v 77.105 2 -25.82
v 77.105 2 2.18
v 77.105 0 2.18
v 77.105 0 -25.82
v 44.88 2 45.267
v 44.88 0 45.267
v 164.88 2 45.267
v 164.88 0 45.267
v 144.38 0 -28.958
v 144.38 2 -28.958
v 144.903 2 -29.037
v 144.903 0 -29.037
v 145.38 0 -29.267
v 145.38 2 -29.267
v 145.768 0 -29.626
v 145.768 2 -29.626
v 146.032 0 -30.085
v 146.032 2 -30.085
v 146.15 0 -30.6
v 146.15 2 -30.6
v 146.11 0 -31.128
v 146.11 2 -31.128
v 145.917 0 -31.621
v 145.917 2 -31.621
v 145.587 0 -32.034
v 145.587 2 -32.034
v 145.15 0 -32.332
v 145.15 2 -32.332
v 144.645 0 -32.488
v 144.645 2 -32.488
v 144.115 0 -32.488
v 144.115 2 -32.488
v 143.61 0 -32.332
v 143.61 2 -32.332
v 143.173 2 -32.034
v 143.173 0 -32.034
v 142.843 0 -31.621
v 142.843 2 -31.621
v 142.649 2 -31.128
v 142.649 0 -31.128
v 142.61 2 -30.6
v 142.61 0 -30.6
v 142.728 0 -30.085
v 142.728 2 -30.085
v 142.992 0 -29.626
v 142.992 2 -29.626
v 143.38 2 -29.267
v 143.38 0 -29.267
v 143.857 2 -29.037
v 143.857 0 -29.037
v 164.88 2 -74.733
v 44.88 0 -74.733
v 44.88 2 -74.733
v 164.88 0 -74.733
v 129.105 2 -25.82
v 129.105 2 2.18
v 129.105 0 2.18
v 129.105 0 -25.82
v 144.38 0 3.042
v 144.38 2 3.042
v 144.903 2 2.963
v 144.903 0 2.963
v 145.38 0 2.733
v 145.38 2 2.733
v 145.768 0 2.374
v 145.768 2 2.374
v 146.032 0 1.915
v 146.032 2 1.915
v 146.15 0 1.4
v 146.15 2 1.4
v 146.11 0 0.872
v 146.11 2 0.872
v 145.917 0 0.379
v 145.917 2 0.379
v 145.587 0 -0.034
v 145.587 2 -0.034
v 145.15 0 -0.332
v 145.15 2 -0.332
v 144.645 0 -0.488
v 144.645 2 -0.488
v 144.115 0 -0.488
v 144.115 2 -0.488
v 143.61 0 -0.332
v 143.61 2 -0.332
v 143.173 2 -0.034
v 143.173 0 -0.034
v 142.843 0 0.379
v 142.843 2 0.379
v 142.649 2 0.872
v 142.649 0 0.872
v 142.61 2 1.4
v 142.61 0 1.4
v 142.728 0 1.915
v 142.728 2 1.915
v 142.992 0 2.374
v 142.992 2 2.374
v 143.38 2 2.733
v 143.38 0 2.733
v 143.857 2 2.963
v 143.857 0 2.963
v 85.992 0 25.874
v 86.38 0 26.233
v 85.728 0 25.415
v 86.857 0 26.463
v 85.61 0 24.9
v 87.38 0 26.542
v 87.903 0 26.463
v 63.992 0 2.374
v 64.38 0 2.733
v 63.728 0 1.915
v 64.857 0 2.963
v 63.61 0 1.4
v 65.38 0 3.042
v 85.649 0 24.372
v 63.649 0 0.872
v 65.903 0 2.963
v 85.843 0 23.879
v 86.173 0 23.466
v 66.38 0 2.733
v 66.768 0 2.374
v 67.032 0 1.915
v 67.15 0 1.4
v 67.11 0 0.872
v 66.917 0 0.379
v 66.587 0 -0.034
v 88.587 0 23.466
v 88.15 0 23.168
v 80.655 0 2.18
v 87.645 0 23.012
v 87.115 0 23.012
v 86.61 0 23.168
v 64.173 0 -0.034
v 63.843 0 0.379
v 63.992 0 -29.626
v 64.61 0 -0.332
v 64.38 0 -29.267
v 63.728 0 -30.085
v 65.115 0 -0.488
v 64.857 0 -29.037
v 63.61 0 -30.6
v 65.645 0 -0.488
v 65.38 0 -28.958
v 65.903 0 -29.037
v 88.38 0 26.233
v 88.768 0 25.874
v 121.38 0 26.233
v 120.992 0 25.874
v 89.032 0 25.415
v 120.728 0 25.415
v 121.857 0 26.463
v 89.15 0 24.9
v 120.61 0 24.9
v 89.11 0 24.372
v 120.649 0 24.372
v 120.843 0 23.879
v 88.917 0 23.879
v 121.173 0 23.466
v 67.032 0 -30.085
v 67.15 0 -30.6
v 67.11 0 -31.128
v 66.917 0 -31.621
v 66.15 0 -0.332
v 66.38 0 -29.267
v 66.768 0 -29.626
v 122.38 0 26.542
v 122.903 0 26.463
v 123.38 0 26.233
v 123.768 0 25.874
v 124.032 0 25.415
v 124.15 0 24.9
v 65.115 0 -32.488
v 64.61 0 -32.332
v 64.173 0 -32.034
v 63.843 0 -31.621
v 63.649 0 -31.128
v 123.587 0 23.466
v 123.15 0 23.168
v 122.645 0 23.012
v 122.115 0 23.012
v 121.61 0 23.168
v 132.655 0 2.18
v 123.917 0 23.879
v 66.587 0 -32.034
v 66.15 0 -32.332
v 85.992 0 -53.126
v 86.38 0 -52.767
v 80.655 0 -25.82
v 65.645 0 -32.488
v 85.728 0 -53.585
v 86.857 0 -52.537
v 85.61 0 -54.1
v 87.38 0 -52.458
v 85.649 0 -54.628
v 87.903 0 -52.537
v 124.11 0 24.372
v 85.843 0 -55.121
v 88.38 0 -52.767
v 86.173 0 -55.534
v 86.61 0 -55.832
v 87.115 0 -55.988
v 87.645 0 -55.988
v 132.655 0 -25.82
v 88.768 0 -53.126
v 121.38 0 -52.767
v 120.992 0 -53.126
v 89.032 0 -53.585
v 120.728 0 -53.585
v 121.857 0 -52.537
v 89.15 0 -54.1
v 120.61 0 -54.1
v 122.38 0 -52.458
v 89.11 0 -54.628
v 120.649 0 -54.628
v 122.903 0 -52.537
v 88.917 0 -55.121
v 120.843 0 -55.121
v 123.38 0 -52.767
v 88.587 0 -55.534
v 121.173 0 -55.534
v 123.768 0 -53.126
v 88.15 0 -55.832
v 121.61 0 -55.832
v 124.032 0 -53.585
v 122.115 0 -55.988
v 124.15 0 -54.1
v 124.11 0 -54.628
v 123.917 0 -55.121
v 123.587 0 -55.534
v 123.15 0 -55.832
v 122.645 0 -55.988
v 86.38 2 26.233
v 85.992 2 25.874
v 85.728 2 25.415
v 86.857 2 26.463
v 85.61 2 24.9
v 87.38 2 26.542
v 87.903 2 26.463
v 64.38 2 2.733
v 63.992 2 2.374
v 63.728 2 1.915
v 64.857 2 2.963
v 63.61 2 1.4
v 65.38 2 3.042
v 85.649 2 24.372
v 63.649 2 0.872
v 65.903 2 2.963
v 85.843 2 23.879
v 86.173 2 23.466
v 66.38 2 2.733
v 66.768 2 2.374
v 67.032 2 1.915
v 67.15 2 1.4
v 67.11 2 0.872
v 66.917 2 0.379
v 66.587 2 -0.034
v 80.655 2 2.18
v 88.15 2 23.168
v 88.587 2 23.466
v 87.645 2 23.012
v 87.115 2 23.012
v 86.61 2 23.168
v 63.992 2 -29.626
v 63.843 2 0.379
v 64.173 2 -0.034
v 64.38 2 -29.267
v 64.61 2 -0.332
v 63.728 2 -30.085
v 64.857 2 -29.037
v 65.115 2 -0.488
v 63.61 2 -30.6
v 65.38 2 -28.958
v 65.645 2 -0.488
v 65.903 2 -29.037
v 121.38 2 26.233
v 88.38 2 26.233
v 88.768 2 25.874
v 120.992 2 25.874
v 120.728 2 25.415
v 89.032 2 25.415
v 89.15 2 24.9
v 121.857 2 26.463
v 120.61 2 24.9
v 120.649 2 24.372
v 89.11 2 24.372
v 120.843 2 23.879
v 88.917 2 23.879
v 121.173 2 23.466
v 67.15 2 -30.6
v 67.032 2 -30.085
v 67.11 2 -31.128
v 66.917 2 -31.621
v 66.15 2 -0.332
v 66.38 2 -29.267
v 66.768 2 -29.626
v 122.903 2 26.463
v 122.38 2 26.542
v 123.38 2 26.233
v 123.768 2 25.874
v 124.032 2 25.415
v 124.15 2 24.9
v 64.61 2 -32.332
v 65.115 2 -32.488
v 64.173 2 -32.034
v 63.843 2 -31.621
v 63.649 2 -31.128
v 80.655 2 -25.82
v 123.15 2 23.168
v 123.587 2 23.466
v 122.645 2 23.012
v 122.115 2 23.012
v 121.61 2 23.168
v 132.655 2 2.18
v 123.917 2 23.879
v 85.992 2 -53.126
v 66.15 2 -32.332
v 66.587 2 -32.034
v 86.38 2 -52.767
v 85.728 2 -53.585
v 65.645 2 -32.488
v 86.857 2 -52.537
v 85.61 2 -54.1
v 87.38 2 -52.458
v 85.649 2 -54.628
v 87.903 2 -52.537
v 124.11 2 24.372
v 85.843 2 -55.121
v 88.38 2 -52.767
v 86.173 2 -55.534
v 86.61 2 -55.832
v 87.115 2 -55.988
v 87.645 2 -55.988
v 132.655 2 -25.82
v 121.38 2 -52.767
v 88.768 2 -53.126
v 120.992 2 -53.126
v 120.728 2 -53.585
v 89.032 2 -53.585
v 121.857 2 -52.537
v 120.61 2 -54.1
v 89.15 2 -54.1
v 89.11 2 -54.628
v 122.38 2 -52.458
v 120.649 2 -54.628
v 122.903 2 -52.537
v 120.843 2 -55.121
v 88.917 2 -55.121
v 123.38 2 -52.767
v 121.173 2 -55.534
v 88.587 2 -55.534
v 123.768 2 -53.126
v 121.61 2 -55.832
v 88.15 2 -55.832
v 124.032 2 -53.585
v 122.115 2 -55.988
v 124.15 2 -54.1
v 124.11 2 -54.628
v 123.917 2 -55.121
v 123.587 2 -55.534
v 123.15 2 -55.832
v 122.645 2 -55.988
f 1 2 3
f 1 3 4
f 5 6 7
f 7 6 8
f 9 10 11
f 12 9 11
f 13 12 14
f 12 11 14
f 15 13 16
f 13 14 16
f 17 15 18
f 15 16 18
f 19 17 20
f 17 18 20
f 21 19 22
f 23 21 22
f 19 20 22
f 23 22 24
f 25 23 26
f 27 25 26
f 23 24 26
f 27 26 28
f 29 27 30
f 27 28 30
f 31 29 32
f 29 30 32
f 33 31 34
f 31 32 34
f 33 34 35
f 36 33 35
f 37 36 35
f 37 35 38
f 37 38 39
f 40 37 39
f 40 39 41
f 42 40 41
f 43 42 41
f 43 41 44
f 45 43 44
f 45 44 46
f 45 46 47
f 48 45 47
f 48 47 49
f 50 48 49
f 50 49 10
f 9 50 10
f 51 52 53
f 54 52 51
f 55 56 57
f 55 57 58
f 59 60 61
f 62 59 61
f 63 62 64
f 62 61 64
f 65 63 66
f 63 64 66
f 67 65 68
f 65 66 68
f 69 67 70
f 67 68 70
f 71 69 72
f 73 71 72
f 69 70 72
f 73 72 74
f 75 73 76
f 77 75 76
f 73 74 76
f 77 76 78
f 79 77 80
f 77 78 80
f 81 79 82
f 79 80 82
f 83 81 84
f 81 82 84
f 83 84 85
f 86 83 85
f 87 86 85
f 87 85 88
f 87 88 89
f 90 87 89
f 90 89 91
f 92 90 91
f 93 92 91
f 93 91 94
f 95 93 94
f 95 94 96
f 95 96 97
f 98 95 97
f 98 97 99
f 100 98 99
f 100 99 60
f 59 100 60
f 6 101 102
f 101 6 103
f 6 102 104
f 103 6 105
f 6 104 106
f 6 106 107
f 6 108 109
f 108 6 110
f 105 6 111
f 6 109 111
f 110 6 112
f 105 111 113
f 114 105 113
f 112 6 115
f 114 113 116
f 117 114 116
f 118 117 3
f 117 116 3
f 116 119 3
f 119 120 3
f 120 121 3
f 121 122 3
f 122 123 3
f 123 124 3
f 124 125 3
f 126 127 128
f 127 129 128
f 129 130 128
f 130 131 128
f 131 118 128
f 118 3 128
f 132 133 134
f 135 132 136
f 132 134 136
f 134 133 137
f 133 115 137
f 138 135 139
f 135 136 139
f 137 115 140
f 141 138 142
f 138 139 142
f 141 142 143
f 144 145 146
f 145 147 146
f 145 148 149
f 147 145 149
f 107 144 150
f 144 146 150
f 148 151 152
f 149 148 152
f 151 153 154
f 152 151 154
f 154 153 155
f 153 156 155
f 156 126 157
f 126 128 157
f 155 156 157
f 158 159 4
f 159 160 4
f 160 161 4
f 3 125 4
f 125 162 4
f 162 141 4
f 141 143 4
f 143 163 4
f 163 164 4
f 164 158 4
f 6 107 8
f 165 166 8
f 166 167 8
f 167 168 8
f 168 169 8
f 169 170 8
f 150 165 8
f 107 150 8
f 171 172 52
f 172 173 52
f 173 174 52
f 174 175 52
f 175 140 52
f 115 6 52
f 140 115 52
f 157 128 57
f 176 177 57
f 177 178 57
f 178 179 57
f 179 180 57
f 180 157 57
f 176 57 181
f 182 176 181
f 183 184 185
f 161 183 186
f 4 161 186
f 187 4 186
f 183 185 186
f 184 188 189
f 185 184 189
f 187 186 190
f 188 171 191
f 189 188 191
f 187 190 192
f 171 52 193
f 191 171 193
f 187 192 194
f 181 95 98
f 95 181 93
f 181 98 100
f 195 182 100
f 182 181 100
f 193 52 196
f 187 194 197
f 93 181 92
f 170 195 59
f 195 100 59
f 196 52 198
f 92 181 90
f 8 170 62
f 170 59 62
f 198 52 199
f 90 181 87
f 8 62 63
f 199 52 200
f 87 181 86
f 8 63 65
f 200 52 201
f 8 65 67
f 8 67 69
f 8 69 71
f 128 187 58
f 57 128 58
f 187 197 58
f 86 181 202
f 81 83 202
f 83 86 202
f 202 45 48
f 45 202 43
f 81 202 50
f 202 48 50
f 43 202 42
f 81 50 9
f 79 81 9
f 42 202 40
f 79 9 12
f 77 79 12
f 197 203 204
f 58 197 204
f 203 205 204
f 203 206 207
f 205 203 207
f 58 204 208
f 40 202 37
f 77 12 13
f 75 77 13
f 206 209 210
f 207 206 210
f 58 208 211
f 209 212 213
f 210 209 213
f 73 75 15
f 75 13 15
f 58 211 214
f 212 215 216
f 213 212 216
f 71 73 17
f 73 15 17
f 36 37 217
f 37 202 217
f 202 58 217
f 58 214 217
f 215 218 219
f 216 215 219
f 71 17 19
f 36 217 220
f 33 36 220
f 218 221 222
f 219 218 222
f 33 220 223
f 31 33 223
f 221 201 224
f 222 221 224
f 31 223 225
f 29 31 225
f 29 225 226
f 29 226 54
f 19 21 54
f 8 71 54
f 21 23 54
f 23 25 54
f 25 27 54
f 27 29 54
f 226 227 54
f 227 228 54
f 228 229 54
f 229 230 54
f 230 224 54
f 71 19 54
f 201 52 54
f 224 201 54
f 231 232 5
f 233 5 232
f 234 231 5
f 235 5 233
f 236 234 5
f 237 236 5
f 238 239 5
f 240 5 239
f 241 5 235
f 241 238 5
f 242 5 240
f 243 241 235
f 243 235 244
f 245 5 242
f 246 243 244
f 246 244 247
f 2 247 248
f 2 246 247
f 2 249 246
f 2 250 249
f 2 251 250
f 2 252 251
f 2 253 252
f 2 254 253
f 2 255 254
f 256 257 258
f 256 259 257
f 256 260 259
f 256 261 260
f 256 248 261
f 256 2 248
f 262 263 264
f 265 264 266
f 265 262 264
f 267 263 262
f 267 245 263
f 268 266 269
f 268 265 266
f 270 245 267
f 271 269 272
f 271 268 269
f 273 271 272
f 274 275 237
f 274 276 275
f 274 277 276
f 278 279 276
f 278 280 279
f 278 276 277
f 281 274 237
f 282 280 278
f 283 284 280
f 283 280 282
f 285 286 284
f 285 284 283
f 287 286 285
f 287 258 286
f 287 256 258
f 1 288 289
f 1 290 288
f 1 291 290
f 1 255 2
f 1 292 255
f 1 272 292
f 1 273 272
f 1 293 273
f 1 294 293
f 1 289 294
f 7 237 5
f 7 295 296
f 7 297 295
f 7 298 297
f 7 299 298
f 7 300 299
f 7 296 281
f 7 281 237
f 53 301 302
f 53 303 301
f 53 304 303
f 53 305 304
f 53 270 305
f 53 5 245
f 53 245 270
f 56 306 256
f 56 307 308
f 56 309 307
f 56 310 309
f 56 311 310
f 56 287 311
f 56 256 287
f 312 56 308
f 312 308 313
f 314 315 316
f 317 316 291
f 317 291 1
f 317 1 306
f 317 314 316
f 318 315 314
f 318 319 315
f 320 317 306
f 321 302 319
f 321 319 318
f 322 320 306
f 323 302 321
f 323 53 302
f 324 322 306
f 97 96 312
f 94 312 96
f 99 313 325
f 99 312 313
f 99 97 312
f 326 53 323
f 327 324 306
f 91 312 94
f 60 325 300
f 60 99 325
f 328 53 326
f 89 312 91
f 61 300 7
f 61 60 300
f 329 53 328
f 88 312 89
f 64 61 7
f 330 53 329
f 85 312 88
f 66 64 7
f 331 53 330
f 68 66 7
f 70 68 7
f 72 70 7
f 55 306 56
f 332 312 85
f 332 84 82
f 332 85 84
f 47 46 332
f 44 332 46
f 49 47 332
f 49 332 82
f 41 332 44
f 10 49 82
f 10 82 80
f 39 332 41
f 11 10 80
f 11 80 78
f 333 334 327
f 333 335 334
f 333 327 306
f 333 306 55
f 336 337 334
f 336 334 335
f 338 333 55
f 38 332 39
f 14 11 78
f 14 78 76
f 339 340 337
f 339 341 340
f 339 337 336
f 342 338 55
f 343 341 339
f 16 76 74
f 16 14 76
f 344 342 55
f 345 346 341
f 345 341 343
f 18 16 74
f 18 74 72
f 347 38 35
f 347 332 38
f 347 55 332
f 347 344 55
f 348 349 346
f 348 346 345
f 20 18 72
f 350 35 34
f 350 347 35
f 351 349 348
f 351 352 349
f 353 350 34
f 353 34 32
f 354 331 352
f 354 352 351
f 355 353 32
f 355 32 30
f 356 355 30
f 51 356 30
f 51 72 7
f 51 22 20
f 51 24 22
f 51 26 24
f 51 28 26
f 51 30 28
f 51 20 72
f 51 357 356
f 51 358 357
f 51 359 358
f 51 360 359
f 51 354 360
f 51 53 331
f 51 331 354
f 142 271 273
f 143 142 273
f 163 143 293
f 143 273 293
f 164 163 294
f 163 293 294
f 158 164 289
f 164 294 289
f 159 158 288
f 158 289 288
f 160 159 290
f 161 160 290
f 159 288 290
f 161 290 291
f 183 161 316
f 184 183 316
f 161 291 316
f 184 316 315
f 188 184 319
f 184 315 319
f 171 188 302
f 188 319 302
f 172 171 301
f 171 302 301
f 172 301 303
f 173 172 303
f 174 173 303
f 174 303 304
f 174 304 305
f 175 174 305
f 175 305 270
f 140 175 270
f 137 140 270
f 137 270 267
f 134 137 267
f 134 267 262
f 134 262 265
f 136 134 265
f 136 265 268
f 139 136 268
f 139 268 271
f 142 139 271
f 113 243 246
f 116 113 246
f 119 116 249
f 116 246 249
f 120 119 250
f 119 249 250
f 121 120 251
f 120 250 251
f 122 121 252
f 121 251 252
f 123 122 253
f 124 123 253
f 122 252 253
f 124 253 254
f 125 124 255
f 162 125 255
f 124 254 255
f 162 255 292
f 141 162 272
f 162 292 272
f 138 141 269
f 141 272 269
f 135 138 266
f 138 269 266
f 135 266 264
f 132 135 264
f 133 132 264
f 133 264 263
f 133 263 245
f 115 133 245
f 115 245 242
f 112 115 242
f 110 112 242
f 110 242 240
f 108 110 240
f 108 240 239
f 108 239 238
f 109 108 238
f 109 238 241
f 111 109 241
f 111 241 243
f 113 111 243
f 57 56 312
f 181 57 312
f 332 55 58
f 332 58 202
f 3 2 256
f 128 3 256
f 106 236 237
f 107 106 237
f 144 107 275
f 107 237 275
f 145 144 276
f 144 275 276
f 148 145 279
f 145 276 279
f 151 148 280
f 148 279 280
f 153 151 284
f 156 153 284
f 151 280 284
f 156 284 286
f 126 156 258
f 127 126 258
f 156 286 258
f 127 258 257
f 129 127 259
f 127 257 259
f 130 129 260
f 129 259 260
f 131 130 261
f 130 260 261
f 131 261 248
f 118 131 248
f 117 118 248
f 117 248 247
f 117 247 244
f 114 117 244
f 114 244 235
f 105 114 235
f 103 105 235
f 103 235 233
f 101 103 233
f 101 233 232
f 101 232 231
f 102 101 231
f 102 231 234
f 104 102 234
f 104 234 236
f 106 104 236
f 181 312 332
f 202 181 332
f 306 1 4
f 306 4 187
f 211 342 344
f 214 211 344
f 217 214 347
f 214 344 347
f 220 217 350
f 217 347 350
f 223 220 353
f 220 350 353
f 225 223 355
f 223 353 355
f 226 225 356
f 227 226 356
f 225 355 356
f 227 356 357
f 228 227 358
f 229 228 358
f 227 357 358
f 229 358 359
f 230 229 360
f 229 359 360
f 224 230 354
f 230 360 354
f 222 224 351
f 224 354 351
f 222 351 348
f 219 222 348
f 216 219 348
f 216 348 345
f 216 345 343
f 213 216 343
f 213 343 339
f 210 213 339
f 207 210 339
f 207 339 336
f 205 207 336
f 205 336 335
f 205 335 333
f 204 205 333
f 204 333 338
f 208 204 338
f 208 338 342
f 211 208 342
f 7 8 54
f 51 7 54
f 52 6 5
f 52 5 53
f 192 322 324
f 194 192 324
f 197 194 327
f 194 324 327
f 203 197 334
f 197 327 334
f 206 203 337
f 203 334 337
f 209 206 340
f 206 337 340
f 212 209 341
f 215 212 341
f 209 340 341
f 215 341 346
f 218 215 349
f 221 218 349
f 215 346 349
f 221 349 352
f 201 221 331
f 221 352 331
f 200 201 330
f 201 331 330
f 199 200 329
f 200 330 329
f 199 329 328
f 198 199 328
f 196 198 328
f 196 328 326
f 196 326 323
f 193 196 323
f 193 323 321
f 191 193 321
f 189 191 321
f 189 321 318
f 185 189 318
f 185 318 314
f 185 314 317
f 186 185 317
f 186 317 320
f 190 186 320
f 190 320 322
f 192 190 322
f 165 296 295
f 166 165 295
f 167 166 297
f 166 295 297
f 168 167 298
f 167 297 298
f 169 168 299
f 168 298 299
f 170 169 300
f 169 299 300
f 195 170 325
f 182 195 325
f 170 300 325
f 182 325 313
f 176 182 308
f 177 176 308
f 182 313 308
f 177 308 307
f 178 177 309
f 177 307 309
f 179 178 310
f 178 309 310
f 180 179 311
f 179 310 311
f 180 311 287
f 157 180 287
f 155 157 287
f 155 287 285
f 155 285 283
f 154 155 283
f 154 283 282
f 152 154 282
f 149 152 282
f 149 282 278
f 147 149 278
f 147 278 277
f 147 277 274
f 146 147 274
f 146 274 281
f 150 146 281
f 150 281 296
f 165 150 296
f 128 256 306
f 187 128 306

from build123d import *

# Parameters (mm, degrees)
SKETCH1_W           = 120
SKETCH1_H           = 120
BOSS_EXTRUDE1_DEPTH = 2
SKETCH2_R           = 1.775
CUT_EXTRUDE1_DEPTH  = 182.037166061
SKETCH3_R           = 1.775
CUT_EXTRUDE2_DEPTH  = 182.037166061
SKETCH4_W           = 3.55
SKETCH4_H           = 28
CUT_EXTRUDE3_DEPTH  = 182.037166061


with BuildPart() as part:
    # Sketch1 → Boss-Extrude1 (new body)
    with BuildSketch(Plane(origin=(0, 0, 0), x_dir=(1, 0, 0), z_dir=(0, 1, 0))):
        with Locations((104.879995502, 14.733142437)):
            Rectangle(SKETCH1_W, SKETCH1_H)
    extrude(amount=BOSS_EXTRUDE1_DEPTH)

    # Sketch2 → Cut-Extrude1 (cut, through all)
    with BuildSketch(Plane(origin=(0, 2, 0), x_dir=(1, 0, 0), z_dir=(0, 1, 0))):
        with Locations(Location((65.379995502, 30.733142437, 0), (0, 0, 270))):
            Circle(SKETCH2_R)
        with Locations(Location((65.379995502, -1.266857563, 0), (0, 0, 270))):
            Circle(SKETCH2_R)
        with Locations(Location((144.379995502, -1.266857563, 0), (0, 0, 270))):
            Circle(SKETCH2_R)
        with Locations(Location((144.379995502, 30.733142437, 0), (0, 0, 270))):
            Circle(SKETCH2_R)
    extrude(amount=-CUT_EXTRUDE1_DEPTH, mode=Mode.SUBTRACT)

    # Sketch3 → Cut-Extrude2 (cut, through all)
    with BuildSketch(Plane(origin=(0, 2, 0), x_dir=(1, 0, 0), z_dir=(0, 1, 0))):
        with Locations(Location((87.379995502, -24.766857563, 0), (0, 0, 270))):
            Circle(SKETCH3_R)
        with Locations(Location((87.379995502, 54.233142437, 0), (0, 0, 270))):
            Circle(SKETCH3_R)
        with Locations(Location((122.379995502, -24.766857563, 0), (0, 0, 270))):
            Circle(SKETCH3_R)
        with Locations(Location((122.379995502, 54.233142437, 0), (0, 0, 270))):
            Circle(SKETCH3_R)
    extrude(amount=-CUT_EXTRUDE2_DEPTH, mode=Mode.SUBTRACT)

    # Sketch4 → Cut-Extrude3 (cut, through all)
    with BuildSketch(Plane(origin=(0, 2, 0), x_dir=(1, 0, 0), z_dir=(0, 1, 0))):
        with Locations((78.879995502, 11.820412138)):
            Rectangle(SKETCH4_W, SKETCH4_H)
        with Locations((130.879995502, 11.820412138)):
            Rectangle(SKETCH4_W, SKETCH4_H)
    extrude(amount=-CUT_EXTRUDE3_DEPTH, mode=Mode.SUBTRACT)


solid = part.part
